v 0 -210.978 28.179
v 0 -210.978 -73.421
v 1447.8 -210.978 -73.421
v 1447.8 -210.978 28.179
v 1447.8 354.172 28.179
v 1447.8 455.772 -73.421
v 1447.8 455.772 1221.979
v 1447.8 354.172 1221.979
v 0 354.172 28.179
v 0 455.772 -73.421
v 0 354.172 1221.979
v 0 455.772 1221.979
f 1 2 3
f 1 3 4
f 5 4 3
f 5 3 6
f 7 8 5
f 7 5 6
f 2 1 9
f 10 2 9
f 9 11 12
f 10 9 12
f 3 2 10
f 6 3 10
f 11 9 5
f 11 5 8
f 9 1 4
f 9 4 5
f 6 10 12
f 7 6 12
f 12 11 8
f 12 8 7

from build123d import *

# Parameters (mm, degrees)
F0_W     = 565.15
F0_H     = 101.6
F1_DEPTH = 1447.8
F2_W     = 101.6
F2_H     = 1295.4
F3_DEPTH = 1447.8


with BuildPart() as f1:
    # F0 (on Right) → F1 (new body)
    with BuildSketch(Plane.YZ):
        with Locations((71.596854, -22.620682)):
            Rectangle(F0_W, F0_H)
    extrude(amount=F1_DEPTH)

    # F2 (on Right) → F3 (join)
    with BuildSketch(Plane.YZ):
        with Locations((404.971854, 574.279318)):
            Rectangle(F2_W, F2_H)
    extrude(amount=F3_DEPTH)


solid = f1.part
